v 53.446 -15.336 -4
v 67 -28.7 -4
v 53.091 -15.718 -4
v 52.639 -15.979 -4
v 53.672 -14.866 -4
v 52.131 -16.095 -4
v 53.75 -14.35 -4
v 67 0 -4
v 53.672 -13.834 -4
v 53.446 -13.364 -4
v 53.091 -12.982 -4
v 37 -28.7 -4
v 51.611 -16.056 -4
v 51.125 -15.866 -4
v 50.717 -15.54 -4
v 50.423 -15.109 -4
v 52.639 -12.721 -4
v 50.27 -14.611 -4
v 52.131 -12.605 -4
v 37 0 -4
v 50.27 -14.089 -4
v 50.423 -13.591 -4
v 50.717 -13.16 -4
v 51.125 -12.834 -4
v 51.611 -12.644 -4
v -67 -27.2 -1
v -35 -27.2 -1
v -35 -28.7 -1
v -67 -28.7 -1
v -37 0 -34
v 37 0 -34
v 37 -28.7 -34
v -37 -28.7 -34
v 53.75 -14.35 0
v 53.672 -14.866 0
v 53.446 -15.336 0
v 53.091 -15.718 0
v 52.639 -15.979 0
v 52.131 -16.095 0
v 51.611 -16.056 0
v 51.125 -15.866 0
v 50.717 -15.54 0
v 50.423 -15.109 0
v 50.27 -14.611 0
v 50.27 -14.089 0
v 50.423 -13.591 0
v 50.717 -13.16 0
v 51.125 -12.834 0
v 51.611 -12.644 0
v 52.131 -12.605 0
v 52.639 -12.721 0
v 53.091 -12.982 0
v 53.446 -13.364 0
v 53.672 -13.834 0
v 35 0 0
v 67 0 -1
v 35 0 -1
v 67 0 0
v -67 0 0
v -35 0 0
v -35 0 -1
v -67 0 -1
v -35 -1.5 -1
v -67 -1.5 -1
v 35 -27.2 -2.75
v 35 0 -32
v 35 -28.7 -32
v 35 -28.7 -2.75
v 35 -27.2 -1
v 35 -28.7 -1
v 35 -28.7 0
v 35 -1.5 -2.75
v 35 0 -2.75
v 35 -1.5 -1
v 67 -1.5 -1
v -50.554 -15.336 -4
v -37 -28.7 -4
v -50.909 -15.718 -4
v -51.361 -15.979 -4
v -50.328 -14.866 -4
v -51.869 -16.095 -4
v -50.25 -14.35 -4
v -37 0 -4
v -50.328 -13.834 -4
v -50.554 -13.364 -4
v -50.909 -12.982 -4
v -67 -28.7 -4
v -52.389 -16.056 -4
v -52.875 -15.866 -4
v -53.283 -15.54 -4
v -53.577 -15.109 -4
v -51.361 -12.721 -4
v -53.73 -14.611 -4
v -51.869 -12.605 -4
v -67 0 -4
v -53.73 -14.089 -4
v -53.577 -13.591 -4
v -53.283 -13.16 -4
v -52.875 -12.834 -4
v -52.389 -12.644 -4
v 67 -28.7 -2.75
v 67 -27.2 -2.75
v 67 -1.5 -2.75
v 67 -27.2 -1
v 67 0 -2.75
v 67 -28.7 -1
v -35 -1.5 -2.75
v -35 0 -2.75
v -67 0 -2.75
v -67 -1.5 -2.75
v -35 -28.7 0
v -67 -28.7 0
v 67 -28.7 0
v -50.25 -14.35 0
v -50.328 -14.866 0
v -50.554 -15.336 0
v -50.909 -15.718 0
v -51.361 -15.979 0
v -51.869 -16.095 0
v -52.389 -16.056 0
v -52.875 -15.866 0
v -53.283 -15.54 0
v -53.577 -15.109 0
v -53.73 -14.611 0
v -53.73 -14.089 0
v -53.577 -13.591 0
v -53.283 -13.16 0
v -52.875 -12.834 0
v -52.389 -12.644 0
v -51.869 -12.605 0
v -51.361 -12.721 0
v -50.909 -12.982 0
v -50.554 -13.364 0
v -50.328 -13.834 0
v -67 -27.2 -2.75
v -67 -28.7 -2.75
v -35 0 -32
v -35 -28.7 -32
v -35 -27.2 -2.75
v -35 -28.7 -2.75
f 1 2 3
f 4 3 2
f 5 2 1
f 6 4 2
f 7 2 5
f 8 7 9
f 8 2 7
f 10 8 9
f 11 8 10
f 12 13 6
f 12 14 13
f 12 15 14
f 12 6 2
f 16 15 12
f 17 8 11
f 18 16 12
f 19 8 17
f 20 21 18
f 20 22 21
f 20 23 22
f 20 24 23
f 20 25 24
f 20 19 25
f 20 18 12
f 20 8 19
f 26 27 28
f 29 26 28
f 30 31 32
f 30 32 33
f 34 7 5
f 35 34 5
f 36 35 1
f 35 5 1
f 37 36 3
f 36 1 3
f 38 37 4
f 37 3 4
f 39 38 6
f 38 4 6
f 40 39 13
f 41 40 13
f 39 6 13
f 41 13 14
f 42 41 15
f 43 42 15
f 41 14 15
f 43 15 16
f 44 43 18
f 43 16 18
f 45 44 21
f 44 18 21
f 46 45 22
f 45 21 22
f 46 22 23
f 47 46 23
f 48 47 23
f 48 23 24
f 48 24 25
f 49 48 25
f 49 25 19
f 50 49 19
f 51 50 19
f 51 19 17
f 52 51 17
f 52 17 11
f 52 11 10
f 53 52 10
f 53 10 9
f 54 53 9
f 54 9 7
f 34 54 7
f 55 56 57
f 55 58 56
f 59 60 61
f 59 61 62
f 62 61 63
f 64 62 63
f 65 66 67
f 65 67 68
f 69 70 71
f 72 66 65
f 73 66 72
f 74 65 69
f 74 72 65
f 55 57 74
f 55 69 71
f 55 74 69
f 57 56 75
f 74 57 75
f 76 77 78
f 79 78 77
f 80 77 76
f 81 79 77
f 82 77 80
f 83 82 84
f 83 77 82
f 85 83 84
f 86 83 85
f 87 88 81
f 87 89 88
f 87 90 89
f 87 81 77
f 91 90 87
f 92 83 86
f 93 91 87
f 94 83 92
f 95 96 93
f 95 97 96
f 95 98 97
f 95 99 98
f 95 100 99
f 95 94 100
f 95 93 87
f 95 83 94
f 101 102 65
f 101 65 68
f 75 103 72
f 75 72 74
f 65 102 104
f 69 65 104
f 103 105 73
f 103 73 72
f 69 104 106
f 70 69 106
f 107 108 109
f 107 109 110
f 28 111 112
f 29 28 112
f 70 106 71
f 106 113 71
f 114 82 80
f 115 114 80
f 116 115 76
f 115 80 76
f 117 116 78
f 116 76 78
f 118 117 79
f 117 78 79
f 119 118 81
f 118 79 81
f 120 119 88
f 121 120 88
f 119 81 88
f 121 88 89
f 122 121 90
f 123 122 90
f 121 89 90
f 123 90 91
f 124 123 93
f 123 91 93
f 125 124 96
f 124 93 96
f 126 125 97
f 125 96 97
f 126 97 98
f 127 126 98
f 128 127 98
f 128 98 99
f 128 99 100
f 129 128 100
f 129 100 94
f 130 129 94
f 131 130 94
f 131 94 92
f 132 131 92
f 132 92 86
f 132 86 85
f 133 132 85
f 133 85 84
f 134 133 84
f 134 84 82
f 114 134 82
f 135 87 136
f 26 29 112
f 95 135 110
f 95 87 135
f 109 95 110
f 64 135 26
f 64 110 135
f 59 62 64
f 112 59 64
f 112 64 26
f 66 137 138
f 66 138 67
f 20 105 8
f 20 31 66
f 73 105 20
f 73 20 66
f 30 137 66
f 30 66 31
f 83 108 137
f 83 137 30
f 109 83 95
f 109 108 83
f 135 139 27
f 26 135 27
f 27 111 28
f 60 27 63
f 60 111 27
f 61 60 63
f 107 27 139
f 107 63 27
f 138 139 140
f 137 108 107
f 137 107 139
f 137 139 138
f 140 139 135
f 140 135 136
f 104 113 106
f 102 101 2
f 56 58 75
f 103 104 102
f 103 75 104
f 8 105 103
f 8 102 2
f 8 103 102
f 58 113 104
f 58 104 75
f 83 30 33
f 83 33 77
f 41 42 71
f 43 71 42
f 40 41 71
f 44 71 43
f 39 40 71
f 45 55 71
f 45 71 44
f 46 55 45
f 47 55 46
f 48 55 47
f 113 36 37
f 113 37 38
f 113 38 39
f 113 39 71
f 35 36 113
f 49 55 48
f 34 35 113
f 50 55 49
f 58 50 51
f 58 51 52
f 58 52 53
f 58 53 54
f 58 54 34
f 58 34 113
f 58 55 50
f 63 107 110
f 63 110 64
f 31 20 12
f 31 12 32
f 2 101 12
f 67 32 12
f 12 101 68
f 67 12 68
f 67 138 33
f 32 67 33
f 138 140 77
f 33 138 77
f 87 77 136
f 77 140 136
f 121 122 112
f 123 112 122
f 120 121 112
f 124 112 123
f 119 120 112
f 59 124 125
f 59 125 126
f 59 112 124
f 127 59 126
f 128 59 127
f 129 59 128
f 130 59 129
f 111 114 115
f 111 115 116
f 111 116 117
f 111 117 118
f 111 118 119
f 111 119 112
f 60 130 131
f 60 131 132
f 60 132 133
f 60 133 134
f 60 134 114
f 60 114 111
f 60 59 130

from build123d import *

# Parameters (mm, degrees)
PAD_DEPTH       = 28.7
SKETCH001_R     = 1.75
POCKET_DEPTH    = 4.001
SKETCH002_W     = 1.75
SKETCH002_H     = 1.5
POCKET001_DEPTH = 134.001


with BuildPart() as part:
    # Sketch → Pad (new body)
    with BuildSketch(Plane.XZ):
        Polygon((-67, 0), (-35, 0), (-35, -32), (35, -32), (35, 0), (67, 0), (67, -4), (37, -4), (37, -34), (-37, -34), (-37, -4), (-67, -4), align=None)
    extrude(amount=PAD_DEPTH)

    # Sketch001 (on Face7 of Pad) → Pocket (cut, through all)
    with BuildSketch(Plane(origin=(0, 0, -4), x_dir=(1, 0, 0), z_dir=(0, 0, -1))):
        with Locations((-52, 14.35)):
            Circle(SKETCH001_R)
        with Locations((52, 14.35)):
            Circle(SKETCH001_R)
    extrude(amount=-POCKET_DEPTH, mode=Mode.SUBTRACT)

    # Sketch002 (on Face11 of Pocket) → Pocket001 (cut, through all)
    with BuildSketch(Plane(origin=(67, 0, 0), x_dir=(0, 0, 1), z_dir=(1, 0, 0))):
        with Locations((-1.875, 27.95)):
            Rectangle(SKETCH002_W, SKETCH002_H)
        with Locations((-1.875, 0.75)):
            Rectangle(SKETCH002_W, SKETCH002_H)
    extrude(amount=-POCKET001_DEPTH, mode=Mode.SUBTRACT)


solid = part.part
